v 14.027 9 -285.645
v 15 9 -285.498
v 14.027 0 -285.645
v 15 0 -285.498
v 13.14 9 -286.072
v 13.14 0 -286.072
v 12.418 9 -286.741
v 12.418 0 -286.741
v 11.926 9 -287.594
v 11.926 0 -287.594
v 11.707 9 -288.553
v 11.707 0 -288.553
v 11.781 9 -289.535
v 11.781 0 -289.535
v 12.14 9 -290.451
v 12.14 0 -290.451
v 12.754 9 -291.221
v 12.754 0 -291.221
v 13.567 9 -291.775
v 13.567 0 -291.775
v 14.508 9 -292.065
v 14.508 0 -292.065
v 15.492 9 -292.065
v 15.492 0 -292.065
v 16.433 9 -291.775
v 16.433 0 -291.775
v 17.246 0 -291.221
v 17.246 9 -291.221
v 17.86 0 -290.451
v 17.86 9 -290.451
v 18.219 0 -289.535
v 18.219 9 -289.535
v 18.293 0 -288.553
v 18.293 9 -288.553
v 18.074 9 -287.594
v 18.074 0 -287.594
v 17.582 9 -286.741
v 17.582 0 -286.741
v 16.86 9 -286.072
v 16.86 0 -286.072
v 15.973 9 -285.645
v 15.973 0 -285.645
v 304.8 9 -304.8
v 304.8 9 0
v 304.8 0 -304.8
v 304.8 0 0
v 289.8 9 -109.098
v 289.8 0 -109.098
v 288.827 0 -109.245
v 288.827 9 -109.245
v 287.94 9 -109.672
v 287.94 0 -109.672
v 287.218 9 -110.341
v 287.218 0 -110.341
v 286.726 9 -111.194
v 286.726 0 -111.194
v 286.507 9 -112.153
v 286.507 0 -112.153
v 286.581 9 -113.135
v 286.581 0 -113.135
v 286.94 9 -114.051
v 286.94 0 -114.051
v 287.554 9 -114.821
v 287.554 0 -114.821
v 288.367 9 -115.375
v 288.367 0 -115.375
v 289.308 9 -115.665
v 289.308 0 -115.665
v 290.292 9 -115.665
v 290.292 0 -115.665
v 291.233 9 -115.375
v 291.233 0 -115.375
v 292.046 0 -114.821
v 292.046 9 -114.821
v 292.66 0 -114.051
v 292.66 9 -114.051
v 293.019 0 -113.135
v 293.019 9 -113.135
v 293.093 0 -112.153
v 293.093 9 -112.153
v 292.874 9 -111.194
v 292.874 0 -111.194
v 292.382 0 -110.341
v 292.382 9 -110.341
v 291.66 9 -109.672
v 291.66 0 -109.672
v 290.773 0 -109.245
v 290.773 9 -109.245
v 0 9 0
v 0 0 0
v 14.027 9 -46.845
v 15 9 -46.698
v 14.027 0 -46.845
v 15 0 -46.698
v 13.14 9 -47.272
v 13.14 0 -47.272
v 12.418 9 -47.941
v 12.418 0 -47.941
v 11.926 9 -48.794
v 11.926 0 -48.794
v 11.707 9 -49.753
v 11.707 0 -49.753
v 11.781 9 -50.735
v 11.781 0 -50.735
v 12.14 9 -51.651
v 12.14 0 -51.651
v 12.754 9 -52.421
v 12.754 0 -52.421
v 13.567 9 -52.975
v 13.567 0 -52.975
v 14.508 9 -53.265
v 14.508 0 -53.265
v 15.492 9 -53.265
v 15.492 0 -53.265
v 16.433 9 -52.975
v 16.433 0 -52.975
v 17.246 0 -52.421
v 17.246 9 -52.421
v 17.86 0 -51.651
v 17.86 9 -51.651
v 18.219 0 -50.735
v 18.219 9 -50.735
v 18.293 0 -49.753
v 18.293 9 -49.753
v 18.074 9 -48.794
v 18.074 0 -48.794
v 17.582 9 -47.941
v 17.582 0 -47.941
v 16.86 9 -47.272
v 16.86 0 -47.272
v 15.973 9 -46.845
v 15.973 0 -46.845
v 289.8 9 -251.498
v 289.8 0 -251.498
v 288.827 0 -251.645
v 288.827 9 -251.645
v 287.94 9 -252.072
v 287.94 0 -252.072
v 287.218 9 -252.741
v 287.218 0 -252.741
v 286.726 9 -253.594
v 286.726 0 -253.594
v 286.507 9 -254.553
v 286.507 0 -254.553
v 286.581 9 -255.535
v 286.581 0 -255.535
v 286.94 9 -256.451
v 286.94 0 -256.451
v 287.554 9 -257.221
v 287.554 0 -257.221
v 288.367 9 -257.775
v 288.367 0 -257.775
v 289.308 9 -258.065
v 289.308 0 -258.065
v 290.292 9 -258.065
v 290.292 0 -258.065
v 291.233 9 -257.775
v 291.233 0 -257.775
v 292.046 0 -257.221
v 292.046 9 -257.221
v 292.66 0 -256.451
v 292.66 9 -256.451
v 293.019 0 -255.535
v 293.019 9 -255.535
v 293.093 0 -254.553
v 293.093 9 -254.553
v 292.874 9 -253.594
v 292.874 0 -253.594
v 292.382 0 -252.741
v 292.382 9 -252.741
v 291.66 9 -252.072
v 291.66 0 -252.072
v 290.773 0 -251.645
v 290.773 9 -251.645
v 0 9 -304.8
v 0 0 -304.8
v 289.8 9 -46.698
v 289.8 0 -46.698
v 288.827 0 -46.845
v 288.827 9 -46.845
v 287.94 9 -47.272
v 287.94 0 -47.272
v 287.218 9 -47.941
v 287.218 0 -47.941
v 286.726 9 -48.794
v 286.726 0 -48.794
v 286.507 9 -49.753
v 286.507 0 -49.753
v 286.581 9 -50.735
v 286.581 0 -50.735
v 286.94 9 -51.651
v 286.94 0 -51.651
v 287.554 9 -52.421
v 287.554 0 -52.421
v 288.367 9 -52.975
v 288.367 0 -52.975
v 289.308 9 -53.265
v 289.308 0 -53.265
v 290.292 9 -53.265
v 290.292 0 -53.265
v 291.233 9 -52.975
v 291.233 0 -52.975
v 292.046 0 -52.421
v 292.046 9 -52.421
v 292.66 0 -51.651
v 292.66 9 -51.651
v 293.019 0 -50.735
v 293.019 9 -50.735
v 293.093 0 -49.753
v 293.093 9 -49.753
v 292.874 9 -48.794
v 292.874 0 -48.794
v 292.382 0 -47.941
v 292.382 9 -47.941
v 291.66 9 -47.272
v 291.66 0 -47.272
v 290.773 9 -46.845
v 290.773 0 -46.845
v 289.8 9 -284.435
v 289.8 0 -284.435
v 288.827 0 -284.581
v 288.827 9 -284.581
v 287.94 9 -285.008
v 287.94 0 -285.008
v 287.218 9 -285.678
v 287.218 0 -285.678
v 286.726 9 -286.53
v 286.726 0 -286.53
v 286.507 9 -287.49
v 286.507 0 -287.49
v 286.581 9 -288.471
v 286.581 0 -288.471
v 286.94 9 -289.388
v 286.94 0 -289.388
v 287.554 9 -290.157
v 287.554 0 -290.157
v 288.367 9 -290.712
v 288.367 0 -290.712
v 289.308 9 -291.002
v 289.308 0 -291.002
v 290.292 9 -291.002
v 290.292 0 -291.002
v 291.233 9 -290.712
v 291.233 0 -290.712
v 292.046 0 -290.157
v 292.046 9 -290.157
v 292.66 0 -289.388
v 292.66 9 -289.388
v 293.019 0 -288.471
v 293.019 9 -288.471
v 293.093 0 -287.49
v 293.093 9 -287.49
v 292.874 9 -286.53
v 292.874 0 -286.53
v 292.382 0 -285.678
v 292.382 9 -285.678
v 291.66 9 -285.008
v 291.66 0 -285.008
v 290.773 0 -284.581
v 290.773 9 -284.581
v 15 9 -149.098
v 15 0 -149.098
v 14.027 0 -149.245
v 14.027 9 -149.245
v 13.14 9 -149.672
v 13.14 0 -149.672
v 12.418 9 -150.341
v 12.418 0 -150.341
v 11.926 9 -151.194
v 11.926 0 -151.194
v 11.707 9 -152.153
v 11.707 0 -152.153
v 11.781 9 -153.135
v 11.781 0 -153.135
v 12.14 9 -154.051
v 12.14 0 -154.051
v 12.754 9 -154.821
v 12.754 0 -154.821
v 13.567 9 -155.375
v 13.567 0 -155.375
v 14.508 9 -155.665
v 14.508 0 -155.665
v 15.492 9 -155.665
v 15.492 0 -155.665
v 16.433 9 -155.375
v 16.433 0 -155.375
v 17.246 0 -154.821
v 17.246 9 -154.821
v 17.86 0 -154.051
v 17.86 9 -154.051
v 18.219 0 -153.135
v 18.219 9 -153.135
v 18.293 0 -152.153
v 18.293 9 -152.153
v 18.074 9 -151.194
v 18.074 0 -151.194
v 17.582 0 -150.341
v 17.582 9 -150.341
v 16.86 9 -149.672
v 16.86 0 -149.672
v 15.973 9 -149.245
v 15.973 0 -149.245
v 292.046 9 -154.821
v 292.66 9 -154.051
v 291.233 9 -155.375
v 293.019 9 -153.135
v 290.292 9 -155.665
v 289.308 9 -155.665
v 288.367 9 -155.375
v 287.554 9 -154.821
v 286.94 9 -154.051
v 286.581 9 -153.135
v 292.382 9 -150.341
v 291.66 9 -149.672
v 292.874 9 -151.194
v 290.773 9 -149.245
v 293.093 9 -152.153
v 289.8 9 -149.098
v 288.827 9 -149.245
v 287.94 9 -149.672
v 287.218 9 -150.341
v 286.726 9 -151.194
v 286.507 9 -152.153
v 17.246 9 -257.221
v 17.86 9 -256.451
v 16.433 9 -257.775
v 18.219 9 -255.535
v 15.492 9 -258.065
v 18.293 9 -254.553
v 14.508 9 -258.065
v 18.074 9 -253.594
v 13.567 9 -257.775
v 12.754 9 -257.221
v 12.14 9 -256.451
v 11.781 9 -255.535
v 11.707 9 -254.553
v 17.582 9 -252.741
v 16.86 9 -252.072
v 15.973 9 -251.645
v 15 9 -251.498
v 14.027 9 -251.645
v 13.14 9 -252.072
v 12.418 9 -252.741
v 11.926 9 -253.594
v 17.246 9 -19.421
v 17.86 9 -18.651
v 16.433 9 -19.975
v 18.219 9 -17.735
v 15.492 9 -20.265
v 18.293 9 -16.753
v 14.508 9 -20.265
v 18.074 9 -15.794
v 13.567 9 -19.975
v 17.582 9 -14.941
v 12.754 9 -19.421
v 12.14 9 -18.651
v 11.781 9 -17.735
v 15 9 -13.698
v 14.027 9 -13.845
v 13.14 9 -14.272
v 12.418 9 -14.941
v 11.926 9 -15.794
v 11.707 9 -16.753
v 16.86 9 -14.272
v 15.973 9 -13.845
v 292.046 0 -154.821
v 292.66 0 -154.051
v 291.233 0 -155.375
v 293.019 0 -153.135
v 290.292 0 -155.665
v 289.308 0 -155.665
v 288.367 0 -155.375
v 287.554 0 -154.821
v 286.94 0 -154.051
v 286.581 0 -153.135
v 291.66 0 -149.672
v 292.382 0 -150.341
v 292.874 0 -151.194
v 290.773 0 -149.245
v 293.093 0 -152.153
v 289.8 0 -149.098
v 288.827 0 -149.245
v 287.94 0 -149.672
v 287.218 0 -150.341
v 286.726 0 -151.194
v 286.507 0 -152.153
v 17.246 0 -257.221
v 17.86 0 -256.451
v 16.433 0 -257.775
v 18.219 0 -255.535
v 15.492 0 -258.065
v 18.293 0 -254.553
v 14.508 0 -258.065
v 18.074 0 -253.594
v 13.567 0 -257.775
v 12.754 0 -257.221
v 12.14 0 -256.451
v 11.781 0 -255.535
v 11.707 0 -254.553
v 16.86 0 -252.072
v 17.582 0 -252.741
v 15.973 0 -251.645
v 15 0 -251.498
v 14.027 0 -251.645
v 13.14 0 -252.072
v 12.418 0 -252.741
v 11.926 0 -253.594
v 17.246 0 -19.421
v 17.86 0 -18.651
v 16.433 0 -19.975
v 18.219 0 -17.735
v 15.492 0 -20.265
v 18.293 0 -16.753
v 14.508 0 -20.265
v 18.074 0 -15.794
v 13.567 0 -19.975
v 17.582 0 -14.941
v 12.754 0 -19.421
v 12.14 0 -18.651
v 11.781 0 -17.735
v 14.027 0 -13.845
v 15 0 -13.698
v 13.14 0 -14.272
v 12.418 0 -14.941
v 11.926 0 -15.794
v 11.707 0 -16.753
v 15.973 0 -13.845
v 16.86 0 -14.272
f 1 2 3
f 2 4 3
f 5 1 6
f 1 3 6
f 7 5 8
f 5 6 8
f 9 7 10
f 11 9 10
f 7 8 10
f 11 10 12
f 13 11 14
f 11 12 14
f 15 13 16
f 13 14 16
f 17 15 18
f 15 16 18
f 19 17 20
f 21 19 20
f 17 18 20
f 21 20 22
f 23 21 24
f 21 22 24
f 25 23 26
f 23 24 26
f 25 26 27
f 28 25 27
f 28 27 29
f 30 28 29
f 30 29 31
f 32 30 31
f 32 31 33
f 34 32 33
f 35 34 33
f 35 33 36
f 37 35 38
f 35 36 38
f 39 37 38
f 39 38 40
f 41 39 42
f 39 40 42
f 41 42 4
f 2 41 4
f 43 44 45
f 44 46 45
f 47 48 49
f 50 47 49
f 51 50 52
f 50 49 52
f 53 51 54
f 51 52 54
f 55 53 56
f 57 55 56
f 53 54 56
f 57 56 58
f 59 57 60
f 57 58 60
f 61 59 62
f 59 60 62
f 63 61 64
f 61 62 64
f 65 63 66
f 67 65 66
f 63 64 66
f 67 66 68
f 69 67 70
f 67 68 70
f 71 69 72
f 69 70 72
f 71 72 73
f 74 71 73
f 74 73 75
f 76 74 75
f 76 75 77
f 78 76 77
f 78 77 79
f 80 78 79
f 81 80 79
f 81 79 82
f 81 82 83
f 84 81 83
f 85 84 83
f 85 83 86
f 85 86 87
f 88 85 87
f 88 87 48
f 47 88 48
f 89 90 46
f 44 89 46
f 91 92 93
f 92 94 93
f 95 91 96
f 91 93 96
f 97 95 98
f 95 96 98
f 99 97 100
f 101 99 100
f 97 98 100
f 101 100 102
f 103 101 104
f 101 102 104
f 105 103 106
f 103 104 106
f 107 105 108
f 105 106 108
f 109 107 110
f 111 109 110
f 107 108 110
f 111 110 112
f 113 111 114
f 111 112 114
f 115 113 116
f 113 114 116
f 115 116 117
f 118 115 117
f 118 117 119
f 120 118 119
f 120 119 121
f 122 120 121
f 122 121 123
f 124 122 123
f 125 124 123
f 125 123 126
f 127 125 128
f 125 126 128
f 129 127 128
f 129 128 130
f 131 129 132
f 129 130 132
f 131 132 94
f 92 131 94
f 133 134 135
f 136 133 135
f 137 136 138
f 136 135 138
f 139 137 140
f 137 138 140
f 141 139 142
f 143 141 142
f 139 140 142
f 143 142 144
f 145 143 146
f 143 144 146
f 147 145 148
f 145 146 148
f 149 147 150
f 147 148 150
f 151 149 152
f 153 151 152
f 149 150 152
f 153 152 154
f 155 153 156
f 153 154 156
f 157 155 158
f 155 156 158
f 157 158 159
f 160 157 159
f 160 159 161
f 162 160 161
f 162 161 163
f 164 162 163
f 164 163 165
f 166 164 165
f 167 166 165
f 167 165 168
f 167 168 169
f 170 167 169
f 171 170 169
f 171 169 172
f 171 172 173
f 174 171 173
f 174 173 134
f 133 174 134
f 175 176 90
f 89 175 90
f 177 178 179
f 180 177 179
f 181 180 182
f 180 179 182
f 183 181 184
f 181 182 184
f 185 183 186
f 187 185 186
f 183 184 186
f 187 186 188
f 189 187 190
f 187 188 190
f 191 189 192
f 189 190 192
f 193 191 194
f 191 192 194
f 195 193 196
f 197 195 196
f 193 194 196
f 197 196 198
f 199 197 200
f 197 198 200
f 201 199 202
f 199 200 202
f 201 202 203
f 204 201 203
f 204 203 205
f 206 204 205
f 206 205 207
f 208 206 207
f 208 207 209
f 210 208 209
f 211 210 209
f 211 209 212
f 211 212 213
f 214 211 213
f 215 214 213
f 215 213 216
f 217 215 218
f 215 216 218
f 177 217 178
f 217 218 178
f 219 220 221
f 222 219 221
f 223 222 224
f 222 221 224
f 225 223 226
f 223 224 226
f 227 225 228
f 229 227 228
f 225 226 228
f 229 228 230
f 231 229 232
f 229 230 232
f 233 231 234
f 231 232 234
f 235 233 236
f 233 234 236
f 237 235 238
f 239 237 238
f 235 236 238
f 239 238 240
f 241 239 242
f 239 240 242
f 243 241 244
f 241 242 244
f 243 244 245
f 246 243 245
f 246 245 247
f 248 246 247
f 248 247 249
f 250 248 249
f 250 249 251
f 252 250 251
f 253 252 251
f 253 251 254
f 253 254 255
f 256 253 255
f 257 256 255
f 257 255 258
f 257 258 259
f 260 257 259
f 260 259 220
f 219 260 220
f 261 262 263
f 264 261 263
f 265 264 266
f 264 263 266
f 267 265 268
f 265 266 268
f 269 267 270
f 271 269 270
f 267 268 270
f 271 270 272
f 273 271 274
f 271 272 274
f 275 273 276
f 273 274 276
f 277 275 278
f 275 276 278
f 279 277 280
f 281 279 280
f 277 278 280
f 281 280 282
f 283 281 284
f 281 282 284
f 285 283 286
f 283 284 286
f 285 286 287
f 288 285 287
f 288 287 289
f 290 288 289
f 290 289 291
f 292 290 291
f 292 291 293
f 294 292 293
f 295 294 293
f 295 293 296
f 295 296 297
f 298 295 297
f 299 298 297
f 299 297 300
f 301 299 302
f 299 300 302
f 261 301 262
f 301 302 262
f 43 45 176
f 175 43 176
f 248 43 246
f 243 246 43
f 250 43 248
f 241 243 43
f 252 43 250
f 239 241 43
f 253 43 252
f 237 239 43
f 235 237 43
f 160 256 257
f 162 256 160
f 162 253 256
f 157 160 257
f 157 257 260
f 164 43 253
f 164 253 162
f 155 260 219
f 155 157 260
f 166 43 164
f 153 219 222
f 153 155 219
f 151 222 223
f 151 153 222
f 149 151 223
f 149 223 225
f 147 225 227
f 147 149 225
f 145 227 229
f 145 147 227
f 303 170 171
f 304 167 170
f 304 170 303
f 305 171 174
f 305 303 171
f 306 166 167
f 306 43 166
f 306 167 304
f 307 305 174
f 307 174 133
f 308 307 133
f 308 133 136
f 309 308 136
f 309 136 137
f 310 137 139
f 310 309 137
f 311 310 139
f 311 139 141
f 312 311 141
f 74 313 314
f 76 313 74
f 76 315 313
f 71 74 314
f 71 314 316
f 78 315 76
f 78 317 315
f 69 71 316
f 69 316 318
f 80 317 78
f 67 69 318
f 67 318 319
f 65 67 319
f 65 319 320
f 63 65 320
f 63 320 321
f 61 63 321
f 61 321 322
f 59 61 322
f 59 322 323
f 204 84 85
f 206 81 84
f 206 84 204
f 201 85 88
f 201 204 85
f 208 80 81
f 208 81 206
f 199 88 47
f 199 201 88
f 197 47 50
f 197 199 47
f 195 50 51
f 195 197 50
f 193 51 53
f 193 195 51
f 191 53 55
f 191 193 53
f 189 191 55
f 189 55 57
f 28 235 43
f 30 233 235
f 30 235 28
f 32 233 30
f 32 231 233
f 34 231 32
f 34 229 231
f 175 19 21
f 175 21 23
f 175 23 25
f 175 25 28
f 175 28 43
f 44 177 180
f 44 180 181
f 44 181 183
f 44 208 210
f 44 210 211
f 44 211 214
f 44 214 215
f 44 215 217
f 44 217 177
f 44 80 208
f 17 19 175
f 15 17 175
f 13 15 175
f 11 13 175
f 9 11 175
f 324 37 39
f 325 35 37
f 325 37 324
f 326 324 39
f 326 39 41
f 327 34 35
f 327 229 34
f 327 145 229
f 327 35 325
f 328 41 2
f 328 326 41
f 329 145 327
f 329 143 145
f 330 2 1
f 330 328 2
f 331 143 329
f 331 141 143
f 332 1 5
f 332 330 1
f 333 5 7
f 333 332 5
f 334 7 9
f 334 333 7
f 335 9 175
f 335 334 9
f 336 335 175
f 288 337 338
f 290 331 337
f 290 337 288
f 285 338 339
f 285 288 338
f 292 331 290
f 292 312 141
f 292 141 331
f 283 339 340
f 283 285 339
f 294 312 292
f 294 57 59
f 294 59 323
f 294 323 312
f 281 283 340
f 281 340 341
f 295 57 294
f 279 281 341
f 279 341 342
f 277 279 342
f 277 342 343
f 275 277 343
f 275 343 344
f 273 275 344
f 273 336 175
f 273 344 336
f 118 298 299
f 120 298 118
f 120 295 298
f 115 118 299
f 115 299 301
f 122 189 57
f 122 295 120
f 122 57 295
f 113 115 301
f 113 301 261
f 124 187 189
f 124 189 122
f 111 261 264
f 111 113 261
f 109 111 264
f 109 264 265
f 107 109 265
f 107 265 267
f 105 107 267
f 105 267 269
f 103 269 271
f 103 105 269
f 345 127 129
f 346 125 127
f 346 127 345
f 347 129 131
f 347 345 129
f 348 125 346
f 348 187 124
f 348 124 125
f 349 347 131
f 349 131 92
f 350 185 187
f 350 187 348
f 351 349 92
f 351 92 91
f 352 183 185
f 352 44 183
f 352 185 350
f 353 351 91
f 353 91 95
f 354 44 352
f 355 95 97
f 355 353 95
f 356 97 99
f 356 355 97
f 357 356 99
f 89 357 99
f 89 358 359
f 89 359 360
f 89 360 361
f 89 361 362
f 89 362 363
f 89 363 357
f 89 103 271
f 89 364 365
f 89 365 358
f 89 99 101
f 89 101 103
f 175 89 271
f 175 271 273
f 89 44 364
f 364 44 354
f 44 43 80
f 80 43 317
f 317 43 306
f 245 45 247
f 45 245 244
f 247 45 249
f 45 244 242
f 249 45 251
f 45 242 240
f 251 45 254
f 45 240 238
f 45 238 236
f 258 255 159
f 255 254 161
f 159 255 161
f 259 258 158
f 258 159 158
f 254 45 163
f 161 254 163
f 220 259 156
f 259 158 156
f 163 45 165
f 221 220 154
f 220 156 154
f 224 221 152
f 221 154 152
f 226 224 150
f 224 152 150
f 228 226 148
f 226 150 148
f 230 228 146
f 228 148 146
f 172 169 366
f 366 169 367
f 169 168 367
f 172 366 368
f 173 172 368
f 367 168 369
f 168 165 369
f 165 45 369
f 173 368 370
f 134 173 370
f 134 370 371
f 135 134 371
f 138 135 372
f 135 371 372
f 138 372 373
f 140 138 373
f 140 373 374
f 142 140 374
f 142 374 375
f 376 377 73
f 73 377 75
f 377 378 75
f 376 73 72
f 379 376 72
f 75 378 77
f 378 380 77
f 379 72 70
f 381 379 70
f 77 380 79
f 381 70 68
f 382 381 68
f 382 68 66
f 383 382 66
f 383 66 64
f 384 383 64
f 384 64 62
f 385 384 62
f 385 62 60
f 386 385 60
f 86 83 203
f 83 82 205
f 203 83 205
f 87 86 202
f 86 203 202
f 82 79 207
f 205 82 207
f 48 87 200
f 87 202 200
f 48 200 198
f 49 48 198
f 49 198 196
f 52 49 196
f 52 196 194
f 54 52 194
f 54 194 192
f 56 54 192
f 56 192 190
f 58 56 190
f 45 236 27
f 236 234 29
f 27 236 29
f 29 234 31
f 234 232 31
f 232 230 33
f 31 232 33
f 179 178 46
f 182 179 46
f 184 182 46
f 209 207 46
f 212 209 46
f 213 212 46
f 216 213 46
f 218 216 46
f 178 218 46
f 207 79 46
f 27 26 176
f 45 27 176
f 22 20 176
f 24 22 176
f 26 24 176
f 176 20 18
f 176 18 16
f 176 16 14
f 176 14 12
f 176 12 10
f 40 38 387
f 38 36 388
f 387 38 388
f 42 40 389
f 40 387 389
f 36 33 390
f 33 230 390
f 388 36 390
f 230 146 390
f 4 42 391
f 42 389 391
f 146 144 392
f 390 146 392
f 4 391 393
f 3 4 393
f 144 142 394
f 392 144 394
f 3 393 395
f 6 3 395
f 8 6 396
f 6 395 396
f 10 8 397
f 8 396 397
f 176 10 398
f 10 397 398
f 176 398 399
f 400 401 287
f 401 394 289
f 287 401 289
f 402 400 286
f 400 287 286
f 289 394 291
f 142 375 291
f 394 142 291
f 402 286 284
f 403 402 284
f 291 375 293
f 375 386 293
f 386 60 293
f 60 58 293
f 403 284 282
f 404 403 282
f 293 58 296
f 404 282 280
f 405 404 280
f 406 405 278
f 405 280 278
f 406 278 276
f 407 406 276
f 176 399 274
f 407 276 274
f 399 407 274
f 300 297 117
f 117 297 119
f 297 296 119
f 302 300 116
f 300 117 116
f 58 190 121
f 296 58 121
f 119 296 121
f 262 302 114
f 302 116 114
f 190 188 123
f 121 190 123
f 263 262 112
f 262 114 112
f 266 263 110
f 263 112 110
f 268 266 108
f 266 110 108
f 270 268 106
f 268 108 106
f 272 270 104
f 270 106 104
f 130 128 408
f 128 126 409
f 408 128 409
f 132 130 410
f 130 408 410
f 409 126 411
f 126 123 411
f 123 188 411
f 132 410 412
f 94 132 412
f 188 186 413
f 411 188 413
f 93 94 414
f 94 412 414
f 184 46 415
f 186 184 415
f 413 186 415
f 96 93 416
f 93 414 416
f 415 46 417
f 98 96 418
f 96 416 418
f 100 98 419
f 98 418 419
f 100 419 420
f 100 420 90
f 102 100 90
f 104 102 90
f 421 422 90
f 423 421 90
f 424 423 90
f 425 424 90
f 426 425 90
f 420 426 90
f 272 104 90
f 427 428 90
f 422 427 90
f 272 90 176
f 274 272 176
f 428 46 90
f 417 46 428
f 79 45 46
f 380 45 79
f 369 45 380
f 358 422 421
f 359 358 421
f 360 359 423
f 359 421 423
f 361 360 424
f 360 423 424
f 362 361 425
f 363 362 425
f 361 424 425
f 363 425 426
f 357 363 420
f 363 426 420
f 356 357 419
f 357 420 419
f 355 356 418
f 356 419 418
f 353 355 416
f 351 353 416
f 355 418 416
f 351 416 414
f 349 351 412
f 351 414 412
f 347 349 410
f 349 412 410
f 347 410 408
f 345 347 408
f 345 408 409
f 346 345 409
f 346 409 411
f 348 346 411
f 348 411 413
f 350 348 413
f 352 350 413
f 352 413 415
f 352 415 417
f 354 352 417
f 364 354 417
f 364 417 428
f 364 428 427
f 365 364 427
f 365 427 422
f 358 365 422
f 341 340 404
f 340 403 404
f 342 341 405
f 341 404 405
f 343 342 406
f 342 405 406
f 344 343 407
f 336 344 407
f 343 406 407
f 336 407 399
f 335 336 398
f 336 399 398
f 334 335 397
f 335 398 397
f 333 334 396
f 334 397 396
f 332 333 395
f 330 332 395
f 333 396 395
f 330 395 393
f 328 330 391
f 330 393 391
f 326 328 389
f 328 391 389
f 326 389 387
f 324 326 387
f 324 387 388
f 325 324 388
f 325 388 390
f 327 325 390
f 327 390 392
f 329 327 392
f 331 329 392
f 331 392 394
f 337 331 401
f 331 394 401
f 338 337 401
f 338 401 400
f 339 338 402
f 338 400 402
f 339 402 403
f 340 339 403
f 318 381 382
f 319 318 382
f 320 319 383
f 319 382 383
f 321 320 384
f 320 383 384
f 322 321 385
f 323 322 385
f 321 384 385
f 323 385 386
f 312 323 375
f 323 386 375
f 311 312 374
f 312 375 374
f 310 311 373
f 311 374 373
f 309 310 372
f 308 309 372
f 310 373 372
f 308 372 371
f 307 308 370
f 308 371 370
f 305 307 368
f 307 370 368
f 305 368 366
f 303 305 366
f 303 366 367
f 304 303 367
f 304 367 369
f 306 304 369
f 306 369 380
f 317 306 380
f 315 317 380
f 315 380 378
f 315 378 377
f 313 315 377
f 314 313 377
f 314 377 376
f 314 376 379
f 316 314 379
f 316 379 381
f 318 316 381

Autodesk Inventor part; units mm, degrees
ref_plane "YZ Plane" through (0, 0, 0) normal (1, 0, 0) x (0, 1, 0)
ref_plane "XZ Plane" through (0, 0, 0) normal (0, 1, 0) x (-1, 0, 0)
ref_plane "XY Plane" through (0, 0, 0) normal (0, 0, 1) x (1, 0, 0)
sketch "Sketch1" plane through (0, 0, 0) normal (0, 1, 0) x (-1, 0, 0)
  line L0 (0, 0) -> (-304.8, 0)
  line L1 (-304.8, 0) -> (-304.8, -304.8)
  line L2 (-304.8, -304.8) -> (0, -304.8)
  line L3 (0, -304.8) -> (0, 0)
  dimension "d0" = 304.8
  dimension "d1" = 304.8
extrude "Extrusion1" add sketch "Sketch1" along normal blind 9
sketch "Sketch2" plane through (0, 9, 0) normal (0, 1, 0) x (1, 0, 0)
  point P0 (0, 0)
sketch "Sketch3" plane through (0, 9, 0) normal (0, 1, 0) x (1, 0, 0)
  line L0 (304.8, 304.8) -> (0, 304.8) projected
  line L1 (152.4, 304.8) -> (152.4, 0) construction
  line L2 (0, 0) -> (304.8, 0) projected
  line L3 (15, 304.8) -> (15, 0) construction
  line L4 (0, 304.8) -> (0, 0) projected
  point P0 (15, 254.8)
  point P1 (15, 152.4)
  point P2 (15, 50)
  point P3 (289.8, 254.8)
  point P4 (289.8, 152.4)
  point P5 (289.8, 50)
  point P6 (15, 288.8)
  point P7 (15, 17)
  point P8 (289.8, 112.4)
  point P9 (289.8, 287.7367)
  dimension "d4" = 15
  dimension "d5" = 50
  dimension "d6" = 50
  dimension "d14" = 16
  dimension "d15" = 40
  dimension "d16" = 17
hole "Hole1" at (15, 9, -254.8) at (289.8, 9, -254.8) at (289.8, 9, -152.4) at (15, 9, -152.4) at (15, 9, -50) at (289.8, 9, -50) at (15, 9, -288.8) at (289.8, 9, -287.7367) at (289.8, 9, -112.4) at (15, 9, -17) direction (0, -1, 0) diameter 6.604 end through all
properties part number "acrylic_base"
